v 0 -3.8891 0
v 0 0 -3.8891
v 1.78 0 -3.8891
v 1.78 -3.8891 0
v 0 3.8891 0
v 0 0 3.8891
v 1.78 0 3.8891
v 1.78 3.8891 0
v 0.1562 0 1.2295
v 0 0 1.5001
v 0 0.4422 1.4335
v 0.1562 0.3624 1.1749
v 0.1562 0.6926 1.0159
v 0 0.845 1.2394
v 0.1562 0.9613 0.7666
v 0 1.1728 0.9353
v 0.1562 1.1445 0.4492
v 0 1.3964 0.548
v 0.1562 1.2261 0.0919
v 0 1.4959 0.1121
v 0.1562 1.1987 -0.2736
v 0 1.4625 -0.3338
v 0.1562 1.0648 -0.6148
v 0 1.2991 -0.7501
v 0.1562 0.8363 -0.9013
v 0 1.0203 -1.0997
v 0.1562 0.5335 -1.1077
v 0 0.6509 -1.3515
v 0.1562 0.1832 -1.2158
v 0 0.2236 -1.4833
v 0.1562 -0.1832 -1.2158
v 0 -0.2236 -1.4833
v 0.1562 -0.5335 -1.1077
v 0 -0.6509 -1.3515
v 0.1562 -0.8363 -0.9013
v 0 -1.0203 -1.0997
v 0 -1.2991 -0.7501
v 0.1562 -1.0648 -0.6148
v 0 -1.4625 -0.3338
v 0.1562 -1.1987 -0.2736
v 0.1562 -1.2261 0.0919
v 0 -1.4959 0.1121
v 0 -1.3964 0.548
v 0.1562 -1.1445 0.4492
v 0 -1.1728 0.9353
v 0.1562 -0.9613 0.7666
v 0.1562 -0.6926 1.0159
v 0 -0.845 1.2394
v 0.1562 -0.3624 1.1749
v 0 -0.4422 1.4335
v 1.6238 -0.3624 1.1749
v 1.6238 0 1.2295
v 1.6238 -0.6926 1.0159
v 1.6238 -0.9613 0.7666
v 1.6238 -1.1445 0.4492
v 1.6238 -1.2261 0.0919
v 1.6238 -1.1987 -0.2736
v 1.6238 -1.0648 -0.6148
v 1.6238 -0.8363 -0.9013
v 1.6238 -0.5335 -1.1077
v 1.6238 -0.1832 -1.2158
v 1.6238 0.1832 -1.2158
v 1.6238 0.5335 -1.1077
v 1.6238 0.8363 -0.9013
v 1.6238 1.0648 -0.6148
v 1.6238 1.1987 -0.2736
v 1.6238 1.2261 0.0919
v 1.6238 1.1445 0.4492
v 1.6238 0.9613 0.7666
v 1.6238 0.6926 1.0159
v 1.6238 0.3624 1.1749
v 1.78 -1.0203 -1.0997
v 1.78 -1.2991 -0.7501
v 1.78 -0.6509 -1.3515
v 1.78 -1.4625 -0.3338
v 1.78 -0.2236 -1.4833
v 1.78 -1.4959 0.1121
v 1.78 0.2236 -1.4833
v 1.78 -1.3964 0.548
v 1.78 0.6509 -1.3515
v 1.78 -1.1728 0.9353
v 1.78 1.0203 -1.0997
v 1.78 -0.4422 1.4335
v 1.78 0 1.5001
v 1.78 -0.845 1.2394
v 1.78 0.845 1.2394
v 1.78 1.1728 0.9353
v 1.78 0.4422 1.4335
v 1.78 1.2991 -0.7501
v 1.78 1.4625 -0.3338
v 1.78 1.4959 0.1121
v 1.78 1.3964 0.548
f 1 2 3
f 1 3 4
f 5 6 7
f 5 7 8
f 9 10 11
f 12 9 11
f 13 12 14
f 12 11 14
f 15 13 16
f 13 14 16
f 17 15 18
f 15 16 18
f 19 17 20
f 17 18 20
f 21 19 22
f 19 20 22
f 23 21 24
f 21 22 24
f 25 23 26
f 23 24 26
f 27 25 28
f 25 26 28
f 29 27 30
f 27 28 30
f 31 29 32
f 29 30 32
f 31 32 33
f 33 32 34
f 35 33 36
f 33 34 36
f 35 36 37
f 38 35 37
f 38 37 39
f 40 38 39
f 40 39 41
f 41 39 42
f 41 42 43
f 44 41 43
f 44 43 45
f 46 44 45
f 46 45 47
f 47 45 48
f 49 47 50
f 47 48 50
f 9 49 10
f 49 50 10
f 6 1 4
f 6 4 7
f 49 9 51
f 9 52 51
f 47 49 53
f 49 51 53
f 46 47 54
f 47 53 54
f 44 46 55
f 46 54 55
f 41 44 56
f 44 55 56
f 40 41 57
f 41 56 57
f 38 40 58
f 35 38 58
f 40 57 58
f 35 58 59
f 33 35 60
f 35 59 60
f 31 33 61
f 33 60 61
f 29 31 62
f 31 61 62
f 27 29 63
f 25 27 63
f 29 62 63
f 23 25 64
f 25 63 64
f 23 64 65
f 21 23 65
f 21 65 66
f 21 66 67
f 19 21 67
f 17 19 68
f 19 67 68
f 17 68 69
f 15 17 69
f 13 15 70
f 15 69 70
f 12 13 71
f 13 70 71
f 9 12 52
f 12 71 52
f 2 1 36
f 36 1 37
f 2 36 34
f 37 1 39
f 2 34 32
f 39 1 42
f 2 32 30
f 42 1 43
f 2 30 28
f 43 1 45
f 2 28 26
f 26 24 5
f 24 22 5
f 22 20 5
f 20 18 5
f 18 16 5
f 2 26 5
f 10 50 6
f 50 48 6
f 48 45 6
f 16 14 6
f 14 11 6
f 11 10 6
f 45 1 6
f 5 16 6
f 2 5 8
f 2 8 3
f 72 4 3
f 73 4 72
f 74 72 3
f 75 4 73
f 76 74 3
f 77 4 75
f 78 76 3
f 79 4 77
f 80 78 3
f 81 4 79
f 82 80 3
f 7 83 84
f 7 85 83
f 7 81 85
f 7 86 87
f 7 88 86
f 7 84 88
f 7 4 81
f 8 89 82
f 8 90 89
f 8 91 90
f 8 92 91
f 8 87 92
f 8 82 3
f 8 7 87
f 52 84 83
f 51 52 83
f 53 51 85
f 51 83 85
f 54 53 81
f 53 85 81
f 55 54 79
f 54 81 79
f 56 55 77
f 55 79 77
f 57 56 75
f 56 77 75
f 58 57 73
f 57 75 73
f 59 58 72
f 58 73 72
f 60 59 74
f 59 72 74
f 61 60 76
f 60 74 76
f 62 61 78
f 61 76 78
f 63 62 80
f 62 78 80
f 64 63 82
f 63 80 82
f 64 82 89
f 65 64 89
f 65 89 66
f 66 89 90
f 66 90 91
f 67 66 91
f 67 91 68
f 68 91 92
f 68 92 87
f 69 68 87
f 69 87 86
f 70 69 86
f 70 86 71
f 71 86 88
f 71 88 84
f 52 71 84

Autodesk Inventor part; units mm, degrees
ref_plane "YZ Plane" through (0, 0, 0) normal (1, 0, 0) x (0, 1, 0)
ref_plane "XZ Plane" through (0, 0, 0) normal (0, 1, 0) x (-1, 0, 0)
sketch "Sketch1" plane through (0, 0, 0) normal (1, 0, 0) x (0, 1, 0)
  line L0 (0, -3.8891) -> (-3.8891, 0)
  line L1 (-3.8891, 0) -> (0, 3.8891)
  line L2 (0, 3.8891) -> (3.8891, 0)
  line L3 (3.8891, 0) -> (0, -3.8891)
  line L4 (-5.4447, 0) -> (5.4447, 0) projected
  point P0 (0, 0)
  point P1 (0, 0)
  dimension "d0" = 7.7782
extrude "Body" add sketch "Sketch1" along normal blind 1.78
sketch "Sketch2" plane through (0, 0, 0) normal (-1, 0, 0) x (0, 0, 1)
  point P0 (0, 0)
  point P1 (0, 0)
hole "Thread" at (0, 0, 0) direction (1, 0, 0) diameter 2.459 end through all thread size "M3x0.5" class "6H" standard "ISO Metric profile"
chamfer "Chamfer1" distance 0.2706 angle 30 1 edges at (0, 0, -1.2295) measured on face at (0, -1.5681, 1.6031)
chamfer "Chamfer2" distance 0.2706 angle 30 1 edges at (1.78, 0, -1.2295) measured on face at (1.78, -1.5681, 1.6031)
ref_plane "Work Plane1" through (11.1431, 0, 0) normal (0, 0.7071, -0.7071) x (-1, 0, 0)
equation "\"d0\" = 1.41421 * SW"
equation "\"d1\" = KOH"
equation "\"d3\" = -0.5 * GD1 + 0.5 * NND"
equation "\"d35\" = -0.5 * GD1 + 0.5 * NND"
equation "\"d5\" = -0.5 * GD1 + 0.5 * NND"
equation "\"d36\" = -0.5 * GD1 + 0.5 * NND"
equation "\"NND\" = 3"
equation "\"KOH\" = 1.78"
equation "\"SW\" = 5.5"
equation "\"GUL\" = 0.541266 * PTC"
equation "\"THREADDIA\" = 3"
equation "\"TOA\" = 30deg"
equation "\"PTC\" = 0.5"
equation "\"E0\" = 1.155 * SW"
equation "\"GAL\" = 0.541266 * PTC"
equation "\"GD1\" = 2.458734"
properties part number "AS 1474 - M3" material "Steel, Mild"
